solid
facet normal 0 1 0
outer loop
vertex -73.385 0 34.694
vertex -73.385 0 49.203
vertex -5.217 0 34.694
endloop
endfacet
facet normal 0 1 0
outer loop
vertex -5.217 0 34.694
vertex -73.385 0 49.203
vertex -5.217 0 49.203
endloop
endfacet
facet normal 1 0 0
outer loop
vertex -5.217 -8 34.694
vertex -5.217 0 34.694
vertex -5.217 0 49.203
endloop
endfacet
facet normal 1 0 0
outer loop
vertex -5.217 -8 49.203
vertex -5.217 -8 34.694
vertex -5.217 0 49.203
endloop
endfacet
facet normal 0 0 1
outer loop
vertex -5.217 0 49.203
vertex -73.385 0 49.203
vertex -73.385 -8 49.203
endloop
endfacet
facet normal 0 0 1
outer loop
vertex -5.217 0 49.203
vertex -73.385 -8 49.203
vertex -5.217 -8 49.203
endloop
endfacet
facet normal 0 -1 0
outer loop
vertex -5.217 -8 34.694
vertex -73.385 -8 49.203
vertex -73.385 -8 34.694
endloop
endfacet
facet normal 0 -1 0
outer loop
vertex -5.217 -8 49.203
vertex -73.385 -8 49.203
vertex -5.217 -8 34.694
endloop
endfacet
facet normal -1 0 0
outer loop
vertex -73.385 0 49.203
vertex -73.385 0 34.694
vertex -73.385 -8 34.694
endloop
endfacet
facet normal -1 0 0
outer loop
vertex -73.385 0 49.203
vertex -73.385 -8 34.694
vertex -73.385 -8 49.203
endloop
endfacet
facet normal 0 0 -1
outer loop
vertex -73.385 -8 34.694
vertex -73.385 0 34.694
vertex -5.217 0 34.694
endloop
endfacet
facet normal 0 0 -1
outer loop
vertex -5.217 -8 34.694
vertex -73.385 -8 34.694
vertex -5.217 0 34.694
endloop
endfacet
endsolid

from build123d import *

# Parameters (mm, degrees)
F0_W     = 71.9553148374
F0_H     = 6.7674303427
F1_DEPTH = 4
F3_W     = 68.1674219668
F3_H     = 14.5089738071
F4_DEPTH = 8


with BuildPart() as f1:
    # F0 (on Right) → F1 (new body)
    with BuildSketch(Plane.YZ):
        with Locations((-27.2643235512, 7.9523953609)):
            Rectangle(F0_W, F0_H)
    extrude(amount=F1_DEPTH)


with BuildPart() as f4:
    # F3 (on Front) → F4 (new body)
    with BuildSketch(Plane.XZ):
        with Locations((-39.3010582775, 41.9480707496)):
            Rectangle(F3_W, F3_H)
    extrude(amount=F4_DEPTH)


solid = f4.part
